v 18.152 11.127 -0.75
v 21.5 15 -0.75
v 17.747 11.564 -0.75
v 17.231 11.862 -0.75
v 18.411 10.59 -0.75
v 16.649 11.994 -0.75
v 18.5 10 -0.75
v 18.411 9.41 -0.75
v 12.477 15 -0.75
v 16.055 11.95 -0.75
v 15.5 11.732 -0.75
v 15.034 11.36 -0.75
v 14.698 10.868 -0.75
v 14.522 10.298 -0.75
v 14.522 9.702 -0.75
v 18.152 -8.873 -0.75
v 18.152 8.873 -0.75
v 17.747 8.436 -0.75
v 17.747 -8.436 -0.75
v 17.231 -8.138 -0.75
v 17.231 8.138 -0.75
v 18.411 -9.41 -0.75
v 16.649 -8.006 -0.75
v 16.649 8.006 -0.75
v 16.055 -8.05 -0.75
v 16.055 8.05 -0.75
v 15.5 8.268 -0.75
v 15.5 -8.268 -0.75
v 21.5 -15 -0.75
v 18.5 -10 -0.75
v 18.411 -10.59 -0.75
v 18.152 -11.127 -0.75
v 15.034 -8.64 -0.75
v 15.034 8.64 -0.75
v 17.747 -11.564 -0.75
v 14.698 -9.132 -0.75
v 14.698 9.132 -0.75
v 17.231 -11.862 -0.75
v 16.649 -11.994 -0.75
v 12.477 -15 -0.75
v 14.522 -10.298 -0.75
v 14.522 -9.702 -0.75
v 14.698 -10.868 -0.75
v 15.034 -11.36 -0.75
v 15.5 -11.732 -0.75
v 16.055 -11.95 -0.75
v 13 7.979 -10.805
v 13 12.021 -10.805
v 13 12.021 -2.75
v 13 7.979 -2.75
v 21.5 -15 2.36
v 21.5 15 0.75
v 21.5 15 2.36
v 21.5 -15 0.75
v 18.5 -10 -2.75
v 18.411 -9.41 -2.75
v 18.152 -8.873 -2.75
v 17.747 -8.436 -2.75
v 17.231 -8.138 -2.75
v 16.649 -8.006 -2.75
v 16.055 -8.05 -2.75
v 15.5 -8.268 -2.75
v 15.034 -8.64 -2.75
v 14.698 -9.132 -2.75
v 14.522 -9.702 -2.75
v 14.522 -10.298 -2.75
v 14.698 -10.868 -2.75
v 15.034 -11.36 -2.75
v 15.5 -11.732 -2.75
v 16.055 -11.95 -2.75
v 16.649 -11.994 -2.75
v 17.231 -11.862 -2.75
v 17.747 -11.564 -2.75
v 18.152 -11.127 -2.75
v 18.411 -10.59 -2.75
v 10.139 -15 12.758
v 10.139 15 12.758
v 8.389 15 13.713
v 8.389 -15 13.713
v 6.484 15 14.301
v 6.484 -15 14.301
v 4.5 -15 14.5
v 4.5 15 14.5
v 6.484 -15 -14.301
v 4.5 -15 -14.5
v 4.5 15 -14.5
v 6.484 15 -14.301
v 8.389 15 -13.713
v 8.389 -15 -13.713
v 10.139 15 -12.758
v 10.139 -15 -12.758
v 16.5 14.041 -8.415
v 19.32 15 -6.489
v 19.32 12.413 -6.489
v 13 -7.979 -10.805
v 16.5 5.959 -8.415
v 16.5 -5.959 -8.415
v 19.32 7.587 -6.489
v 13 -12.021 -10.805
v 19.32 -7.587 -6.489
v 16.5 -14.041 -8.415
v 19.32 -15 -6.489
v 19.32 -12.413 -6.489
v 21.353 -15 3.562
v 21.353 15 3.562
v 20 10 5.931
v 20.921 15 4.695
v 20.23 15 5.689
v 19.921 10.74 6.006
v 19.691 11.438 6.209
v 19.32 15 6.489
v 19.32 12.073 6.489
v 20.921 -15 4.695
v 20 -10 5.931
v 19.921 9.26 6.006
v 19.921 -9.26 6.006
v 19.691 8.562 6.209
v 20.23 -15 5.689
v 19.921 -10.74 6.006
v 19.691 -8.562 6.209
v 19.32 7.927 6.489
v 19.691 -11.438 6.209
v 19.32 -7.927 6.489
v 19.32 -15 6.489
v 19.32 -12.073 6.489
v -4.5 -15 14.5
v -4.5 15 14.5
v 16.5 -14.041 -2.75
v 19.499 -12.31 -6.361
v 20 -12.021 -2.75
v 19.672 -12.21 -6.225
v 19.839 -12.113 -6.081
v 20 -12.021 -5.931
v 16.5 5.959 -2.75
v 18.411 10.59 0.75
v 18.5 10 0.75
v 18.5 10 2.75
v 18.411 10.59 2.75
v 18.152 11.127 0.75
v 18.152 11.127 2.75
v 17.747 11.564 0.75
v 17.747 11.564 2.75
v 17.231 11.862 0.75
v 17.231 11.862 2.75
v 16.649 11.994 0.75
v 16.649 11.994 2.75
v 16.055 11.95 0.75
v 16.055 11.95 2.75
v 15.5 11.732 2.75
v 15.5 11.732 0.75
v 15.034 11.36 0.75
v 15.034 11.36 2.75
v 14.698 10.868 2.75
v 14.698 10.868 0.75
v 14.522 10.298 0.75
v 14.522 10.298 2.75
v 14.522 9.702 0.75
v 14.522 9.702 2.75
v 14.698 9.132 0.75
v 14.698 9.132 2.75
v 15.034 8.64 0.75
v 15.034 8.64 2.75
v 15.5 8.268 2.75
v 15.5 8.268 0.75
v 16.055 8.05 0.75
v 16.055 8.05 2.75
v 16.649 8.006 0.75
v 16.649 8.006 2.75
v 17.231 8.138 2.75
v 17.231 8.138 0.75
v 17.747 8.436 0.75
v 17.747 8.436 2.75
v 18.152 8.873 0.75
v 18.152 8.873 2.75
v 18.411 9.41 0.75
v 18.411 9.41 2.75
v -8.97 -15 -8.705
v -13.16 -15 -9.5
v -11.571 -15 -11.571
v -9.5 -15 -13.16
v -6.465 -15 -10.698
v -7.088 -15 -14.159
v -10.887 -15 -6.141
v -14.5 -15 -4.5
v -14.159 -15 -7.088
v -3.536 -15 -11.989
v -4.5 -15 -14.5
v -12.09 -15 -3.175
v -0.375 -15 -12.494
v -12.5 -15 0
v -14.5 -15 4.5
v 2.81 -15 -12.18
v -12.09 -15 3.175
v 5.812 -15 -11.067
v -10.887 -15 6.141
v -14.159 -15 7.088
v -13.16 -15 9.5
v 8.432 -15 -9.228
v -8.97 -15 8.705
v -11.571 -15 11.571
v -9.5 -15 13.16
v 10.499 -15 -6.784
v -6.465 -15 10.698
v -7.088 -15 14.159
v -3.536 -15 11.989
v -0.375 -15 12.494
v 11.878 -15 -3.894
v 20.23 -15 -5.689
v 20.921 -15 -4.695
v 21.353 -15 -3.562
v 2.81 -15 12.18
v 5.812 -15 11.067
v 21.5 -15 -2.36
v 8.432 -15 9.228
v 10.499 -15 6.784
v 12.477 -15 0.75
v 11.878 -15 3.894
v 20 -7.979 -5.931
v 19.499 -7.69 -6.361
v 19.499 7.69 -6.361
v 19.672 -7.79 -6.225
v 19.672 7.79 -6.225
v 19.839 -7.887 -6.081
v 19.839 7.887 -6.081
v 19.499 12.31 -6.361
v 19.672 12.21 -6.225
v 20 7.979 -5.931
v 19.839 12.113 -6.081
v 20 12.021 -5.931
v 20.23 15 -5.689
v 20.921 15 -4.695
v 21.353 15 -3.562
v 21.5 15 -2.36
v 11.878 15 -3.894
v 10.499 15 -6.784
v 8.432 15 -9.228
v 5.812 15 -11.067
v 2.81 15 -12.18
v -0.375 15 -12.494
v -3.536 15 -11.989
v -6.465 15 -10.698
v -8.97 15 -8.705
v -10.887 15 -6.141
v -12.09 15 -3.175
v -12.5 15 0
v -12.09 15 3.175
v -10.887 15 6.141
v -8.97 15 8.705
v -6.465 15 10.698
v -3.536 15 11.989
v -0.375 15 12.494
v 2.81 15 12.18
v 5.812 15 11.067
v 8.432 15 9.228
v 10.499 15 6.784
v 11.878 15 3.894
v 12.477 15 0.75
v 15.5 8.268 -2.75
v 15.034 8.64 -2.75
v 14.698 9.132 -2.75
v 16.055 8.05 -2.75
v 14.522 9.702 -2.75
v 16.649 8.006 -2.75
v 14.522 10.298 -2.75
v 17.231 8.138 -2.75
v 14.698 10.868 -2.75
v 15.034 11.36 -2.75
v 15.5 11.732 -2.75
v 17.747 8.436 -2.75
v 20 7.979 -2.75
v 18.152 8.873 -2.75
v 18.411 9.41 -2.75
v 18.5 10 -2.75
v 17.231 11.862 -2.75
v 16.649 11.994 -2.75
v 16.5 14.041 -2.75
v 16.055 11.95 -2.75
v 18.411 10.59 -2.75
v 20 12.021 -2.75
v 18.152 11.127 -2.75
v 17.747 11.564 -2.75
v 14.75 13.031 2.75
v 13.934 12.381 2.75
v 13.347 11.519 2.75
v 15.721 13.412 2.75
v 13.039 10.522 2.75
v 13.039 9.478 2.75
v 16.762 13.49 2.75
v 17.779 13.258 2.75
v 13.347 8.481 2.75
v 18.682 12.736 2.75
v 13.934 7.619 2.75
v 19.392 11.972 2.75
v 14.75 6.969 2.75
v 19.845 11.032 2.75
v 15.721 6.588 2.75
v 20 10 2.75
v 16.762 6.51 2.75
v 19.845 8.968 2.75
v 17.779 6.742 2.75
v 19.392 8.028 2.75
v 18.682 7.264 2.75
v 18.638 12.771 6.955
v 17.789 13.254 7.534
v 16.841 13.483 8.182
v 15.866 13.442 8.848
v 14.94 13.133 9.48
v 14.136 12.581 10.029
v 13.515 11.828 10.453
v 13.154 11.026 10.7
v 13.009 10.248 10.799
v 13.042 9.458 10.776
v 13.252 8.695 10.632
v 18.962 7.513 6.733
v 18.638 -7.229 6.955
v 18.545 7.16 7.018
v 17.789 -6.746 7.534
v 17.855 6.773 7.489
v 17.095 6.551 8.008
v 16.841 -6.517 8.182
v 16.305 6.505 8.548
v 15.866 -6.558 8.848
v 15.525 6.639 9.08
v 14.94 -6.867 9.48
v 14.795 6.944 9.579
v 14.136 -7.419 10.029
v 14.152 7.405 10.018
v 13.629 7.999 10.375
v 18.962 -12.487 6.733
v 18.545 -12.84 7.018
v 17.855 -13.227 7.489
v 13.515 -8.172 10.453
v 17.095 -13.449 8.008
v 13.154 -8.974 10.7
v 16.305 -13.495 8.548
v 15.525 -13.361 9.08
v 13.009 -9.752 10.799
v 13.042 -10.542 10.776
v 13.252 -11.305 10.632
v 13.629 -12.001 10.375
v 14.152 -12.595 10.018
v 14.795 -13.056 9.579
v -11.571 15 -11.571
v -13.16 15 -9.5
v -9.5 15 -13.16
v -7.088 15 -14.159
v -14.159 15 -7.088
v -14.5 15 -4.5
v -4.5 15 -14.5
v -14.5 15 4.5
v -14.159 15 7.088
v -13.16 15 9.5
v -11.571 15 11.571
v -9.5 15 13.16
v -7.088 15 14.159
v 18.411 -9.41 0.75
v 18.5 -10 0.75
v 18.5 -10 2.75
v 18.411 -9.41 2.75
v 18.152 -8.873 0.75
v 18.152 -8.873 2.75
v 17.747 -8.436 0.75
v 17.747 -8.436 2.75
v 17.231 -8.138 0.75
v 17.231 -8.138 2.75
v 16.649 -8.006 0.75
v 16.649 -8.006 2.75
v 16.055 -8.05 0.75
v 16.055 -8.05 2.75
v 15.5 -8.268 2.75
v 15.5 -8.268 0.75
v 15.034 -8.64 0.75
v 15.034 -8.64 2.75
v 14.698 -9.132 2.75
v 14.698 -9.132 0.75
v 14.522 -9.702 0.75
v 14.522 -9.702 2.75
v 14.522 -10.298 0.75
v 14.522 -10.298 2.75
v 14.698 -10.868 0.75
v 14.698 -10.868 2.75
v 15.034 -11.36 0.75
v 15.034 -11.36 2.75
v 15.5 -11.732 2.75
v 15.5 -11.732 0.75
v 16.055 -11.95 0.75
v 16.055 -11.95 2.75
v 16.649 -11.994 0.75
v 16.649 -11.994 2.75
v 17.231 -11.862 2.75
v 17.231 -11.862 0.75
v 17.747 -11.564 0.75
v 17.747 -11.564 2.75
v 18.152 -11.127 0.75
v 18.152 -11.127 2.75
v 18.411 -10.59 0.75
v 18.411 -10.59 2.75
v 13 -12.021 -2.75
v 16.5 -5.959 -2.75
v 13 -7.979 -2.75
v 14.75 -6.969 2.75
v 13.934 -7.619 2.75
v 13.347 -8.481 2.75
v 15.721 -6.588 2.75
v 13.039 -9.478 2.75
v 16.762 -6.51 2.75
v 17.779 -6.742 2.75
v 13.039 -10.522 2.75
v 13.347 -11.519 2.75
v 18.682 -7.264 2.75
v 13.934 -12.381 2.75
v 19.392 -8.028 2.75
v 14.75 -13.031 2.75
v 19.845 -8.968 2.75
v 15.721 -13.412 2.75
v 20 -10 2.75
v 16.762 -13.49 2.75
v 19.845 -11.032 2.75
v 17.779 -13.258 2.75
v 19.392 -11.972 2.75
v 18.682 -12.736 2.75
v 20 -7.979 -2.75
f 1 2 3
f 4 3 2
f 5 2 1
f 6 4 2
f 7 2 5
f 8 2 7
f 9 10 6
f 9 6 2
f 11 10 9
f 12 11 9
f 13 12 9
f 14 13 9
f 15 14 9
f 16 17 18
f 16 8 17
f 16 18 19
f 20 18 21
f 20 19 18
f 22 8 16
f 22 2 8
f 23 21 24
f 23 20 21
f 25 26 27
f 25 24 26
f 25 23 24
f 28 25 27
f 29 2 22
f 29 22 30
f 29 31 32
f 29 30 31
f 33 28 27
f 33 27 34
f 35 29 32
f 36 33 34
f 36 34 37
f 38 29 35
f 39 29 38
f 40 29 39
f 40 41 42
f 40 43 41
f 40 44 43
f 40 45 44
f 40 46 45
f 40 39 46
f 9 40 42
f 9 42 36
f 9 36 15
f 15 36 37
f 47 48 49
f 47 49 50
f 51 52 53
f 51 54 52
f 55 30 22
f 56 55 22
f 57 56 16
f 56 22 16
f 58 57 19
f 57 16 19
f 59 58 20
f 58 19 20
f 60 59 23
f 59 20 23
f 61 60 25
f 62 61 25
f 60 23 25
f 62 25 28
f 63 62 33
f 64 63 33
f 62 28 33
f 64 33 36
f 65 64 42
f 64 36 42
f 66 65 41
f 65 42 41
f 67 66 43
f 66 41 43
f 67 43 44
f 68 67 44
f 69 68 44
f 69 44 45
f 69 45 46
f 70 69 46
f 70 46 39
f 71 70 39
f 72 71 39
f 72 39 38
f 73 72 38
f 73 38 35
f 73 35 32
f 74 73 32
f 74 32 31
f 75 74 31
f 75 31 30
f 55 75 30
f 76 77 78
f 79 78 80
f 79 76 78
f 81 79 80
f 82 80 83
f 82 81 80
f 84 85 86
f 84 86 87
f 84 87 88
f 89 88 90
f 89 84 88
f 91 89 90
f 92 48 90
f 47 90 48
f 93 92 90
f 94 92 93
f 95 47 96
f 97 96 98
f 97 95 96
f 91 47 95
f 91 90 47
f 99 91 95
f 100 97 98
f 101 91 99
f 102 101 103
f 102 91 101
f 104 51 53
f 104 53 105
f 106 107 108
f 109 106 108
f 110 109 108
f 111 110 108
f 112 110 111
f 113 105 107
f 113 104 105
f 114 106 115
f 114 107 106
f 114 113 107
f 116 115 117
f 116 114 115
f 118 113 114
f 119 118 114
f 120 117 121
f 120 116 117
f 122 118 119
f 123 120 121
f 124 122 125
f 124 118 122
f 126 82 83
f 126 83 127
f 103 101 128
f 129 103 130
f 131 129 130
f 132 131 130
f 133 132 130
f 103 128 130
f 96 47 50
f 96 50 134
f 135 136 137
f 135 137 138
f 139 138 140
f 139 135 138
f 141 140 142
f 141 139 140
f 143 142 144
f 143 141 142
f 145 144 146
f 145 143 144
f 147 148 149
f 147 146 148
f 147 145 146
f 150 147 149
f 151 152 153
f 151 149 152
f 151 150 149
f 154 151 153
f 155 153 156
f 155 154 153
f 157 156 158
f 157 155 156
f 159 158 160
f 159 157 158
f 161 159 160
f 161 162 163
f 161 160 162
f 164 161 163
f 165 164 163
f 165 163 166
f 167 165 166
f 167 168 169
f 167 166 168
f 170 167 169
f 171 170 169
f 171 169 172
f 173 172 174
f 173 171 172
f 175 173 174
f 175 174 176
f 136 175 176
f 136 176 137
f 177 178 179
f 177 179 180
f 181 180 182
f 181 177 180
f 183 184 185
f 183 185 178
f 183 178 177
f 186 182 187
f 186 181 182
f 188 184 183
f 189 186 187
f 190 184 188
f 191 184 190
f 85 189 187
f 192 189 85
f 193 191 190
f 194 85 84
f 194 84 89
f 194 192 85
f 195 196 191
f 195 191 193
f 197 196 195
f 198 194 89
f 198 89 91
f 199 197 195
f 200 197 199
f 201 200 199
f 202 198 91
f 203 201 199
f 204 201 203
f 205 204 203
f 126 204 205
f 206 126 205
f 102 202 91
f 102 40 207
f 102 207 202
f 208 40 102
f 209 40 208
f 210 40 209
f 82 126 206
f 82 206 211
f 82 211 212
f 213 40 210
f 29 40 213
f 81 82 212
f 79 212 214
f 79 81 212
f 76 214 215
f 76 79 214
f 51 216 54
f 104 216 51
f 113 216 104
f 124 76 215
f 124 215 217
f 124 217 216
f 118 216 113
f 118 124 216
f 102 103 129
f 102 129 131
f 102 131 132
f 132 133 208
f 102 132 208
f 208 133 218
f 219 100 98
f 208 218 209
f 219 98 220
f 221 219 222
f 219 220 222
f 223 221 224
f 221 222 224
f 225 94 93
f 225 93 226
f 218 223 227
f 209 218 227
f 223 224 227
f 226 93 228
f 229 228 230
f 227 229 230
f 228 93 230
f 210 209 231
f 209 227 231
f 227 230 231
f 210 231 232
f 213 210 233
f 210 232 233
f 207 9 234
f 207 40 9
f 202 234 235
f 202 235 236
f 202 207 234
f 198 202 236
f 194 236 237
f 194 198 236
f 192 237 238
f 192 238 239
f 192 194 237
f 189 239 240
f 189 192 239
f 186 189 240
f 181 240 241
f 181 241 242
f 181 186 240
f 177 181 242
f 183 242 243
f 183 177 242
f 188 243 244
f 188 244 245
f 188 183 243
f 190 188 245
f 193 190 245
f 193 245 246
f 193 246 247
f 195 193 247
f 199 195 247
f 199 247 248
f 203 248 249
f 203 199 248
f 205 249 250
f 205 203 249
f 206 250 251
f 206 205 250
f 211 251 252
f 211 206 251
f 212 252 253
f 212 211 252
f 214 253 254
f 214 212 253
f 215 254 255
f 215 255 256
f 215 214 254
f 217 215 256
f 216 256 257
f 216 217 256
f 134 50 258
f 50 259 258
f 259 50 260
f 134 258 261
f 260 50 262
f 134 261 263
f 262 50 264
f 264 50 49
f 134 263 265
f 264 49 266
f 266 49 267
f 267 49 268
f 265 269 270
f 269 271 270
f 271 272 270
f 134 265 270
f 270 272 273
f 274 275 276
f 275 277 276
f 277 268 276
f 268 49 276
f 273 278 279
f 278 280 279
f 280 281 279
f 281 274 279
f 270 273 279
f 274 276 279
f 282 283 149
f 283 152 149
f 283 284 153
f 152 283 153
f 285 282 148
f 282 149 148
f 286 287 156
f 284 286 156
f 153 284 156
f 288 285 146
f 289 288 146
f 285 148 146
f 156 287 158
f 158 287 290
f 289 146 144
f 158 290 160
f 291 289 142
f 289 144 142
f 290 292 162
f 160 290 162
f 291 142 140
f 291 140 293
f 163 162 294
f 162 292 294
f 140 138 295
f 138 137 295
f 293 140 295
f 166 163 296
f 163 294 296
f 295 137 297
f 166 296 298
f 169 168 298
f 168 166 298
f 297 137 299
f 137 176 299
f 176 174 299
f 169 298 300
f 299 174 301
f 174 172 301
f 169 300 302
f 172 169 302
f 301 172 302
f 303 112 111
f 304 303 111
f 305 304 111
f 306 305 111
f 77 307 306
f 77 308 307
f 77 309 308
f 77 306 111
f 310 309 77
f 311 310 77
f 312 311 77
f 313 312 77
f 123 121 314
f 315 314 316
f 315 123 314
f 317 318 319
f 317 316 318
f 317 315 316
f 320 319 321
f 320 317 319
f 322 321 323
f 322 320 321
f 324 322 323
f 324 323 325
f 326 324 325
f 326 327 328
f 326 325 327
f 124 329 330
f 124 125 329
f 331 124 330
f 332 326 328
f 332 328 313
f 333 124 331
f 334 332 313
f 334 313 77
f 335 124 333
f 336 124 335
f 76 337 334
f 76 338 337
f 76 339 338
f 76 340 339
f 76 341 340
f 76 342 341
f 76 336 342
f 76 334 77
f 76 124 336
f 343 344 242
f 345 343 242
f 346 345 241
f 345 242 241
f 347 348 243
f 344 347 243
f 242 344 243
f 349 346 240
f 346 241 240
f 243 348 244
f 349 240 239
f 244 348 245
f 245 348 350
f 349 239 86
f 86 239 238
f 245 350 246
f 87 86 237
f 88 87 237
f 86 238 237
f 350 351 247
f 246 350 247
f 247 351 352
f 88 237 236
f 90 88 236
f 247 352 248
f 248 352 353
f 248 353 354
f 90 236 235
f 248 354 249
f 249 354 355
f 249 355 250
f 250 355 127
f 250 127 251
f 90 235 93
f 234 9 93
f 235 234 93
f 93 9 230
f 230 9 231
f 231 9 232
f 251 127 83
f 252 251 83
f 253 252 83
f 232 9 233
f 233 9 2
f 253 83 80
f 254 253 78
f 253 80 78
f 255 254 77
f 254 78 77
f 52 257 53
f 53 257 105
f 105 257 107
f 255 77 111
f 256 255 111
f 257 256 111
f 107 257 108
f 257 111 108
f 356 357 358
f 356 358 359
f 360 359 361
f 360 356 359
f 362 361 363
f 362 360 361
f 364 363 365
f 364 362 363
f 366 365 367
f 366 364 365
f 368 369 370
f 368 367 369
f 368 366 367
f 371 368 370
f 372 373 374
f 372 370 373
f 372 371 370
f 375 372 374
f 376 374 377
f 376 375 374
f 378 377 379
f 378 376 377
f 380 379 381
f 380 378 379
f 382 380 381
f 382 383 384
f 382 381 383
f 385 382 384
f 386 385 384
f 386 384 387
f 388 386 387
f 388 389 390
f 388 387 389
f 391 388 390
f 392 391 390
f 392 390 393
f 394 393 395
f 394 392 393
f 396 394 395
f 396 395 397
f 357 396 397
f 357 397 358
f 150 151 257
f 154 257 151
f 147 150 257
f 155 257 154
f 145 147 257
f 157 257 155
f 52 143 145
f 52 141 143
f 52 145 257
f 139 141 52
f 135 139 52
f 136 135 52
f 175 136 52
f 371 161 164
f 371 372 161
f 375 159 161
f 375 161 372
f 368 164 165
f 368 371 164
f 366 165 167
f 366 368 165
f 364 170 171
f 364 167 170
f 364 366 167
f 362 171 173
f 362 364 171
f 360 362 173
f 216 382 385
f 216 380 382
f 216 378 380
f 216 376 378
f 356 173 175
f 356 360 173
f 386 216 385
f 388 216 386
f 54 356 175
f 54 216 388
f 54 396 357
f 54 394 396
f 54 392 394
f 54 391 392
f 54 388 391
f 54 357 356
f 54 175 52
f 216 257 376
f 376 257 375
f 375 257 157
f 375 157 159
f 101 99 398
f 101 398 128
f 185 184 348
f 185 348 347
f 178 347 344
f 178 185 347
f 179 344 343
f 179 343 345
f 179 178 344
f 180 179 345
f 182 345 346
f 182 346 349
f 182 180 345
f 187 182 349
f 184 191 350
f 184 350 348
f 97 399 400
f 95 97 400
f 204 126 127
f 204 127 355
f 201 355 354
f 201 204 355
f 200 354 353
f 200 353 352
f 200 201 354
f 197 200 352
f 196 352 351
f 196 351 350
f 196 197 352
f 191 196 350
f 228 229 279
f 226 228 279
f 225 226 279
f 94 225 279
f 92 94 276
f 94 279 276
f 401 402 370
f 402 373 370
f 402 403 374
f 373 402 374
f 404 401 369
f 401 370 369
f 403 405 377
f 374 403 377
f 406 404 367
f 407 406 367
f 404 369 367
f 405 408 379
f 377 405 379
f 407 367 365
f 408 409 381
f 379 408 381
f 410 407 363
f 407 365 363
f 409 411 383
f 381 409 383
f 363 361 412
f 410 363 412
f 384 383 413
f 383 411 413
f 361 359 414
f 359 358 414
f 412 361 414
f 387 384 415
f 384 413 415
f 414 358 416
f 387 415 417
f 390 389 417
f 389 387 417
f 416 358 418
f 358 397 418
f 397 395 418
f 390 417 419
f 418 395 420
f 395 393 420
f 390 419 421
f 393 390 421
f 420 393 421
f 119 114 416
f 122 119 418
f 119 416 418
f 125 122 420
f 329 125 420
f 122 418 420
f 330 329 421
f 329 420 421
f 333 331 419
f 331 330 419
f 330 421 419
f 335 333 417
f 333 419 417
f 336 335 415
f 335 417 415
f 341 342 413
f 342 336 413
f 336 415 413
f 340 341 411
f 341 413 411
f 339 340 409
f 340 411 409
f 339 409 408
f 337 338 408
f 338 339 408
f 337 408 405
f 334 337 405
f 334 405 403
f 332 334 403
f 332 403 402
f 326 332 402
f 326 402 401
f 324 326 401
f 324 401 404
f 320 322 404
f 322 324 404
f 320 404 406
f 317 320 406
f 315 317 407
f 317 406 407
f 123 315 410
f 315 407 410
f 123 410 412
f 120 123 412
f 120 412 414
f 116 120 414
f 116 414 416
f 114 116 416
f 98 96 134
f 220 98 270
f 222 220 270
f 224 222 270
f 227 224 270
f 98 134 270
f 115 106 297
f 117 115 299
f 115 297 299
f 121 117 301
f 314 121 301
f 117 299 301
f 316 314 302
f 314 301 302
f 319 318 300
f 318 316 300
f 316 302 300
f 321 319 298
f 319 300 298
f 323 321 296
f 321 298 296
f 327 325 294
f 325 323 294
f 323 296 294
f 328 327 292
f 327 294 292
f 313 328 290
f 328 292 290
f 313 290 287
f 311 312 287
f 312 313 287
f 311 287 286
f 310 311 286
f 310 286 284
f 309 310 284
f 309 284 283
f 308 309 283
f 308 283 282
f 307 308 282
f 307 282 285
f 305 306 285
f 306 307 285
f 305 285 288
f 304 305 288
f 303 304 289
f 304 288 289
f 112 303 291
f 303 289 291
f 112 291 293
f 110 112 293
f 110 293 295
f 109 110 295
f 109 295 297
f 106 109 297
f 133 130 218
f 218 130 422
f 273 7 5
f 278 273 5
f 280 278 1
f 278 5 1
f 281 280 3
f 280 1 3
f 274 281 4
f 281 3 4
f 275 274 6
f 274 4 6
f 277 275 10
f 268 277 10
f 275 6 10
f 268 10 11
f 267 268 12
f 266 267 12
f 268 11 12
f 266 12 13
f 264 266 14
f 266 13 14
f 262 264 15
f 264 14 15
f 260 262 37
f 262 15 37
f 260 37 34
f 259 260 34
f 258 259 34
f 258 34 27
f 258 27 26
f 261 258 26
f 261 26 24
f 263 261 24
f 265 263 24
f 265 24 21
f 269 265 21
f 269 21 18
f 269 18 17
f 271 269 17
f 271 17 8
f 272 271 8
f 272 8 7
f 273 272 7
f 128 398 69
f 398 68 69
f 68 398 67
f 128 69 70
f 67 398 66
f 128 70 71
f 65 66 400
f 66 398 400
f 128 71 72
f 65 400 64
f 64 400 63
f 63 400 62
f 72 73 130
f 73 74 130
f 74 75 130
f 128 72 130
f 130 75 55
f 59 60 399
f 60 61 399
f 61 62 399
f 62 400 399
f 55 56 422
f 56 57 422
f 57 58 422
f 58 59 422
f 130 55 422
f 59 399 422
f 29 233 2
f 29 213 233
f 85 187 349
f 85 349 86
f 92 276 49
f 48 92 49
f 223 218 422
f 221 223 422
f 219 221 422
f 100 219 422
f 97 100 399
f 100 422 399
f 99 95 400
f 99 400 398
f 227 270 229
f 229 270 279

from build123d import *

# Parameters (mm, degrees)
F1_DEPTH      = 15
F2_R          = 2
F3_DEPTH      = 14.501
F3_DEPTH_BACK = 14.501
F5_R          = 5
F6_R          = 3.5
F7_DEPTH      = 11.751
F10_DEPTH     = 11.751


with BuildPart() as f1:
    # F0 (on Front) → F1 (new body, symmetric)
    with BuildSketch(Plane.XZ):
        with BuildLine():
            ThreePointArc((12.4774797135, -0.75), (-12.5, 0), (12.4774797135, 0.75))
            Line((12.4774797135, 0.75), (21.5, 0.75))
            Line((21.5, 0.75), (21.5, 5))
            Line((21.5, 5), (10.1394673035, 12.7581116808))
            ThreePointArc((10.1394673035, 12.7581116808), (7.4511763072, 14.0546092753), (4.5, 14.5))
            Line((4.5, 14.5), (-4.5, 14.5))
            ThreePointArc((-4.5, 14.5), (-11.5710678119, 11.5710678119), (-14.5, 4.5))
            Line((-14.5, 4.5), (-14.5, -4.5))
            ThreePointArc((-14.5, -4.5), (-11.5710678119, -11.5710678119), (-4.5, -14.5))
            Line((-4.5, -14.5), (4.5, -14.5))
            ThreePointArc((4.5, -14.5), (7.4511763072, -14.0546092753), (10.1394673035, -12.7581116808))
            Line((10.1394673035, -12.7581116808), (21.5, -5))
            Line((21.5, -5), (21.5, -0.75))
            Line((21.5, -0.75), (12.4774797135, -0.75))
        make_face()
    extrude(amount=F1_DEPTH, both=True)

    # F2 (on Top) → F3 (cut, two sides)
    with BuildSketch(Plane.XY) as f3_sk:
        with Locations((16.5, 10)):
            Circle(F2_R)
        with Locations((16.5, -10)):
            Circle(F2_R)
    extrude(amount=-F3_DEPTH, mode=Mode.SUBTRACT)
    extrude(f3_sk.sketch, amount=F3_DEPTH_BACK, mode=Mode.SUBTRACT)

    # F5
    f5_edges = [f1.edges().sort_by_distance(p)[0] for p in [
        (21.5, 0, 5),
        (21.5, 0, -5),
    ]]
    fillet(f5_edges, radius=F5_R)

    # F6 (on offset) → F7 (cut, through all)
    with BuildSketch(Plane(origin=(0, 0, 2.75), x_dir=(1, 0, 0), z_dir=(0, 0, -1))):
        with Locations((16.5, 10)):
            Circle(F6_R)
        with Locations((16.5, -10)):
            Circle(F6_R)
    extrude(amount=-F7_DEPTH, mode=Mode.SUBTRACT)

    # F9 (on offset) → F10 (cut, through all)
    with BuildSketch(Plane.XY.offset(-2.75)):
        Polygon((20, 7.9792740578), (20, 12.0207259422), (16.5, 14.0414518843), (13, 12.0207259422), (13, 7.9792740578), (16.5, 5.9585481157), align=None)
        Polygon((20, -12.0207259422), (20, -7.9792740578), (16.5, -5.9585481157), (13, -7.9792740578), (13, -12.0207259422), (16.5, -14.0414518843), align=None)
    extrude(amount=-F10_DEPTH, mode=Mode.SUBTRACT)


solid = f1.part
